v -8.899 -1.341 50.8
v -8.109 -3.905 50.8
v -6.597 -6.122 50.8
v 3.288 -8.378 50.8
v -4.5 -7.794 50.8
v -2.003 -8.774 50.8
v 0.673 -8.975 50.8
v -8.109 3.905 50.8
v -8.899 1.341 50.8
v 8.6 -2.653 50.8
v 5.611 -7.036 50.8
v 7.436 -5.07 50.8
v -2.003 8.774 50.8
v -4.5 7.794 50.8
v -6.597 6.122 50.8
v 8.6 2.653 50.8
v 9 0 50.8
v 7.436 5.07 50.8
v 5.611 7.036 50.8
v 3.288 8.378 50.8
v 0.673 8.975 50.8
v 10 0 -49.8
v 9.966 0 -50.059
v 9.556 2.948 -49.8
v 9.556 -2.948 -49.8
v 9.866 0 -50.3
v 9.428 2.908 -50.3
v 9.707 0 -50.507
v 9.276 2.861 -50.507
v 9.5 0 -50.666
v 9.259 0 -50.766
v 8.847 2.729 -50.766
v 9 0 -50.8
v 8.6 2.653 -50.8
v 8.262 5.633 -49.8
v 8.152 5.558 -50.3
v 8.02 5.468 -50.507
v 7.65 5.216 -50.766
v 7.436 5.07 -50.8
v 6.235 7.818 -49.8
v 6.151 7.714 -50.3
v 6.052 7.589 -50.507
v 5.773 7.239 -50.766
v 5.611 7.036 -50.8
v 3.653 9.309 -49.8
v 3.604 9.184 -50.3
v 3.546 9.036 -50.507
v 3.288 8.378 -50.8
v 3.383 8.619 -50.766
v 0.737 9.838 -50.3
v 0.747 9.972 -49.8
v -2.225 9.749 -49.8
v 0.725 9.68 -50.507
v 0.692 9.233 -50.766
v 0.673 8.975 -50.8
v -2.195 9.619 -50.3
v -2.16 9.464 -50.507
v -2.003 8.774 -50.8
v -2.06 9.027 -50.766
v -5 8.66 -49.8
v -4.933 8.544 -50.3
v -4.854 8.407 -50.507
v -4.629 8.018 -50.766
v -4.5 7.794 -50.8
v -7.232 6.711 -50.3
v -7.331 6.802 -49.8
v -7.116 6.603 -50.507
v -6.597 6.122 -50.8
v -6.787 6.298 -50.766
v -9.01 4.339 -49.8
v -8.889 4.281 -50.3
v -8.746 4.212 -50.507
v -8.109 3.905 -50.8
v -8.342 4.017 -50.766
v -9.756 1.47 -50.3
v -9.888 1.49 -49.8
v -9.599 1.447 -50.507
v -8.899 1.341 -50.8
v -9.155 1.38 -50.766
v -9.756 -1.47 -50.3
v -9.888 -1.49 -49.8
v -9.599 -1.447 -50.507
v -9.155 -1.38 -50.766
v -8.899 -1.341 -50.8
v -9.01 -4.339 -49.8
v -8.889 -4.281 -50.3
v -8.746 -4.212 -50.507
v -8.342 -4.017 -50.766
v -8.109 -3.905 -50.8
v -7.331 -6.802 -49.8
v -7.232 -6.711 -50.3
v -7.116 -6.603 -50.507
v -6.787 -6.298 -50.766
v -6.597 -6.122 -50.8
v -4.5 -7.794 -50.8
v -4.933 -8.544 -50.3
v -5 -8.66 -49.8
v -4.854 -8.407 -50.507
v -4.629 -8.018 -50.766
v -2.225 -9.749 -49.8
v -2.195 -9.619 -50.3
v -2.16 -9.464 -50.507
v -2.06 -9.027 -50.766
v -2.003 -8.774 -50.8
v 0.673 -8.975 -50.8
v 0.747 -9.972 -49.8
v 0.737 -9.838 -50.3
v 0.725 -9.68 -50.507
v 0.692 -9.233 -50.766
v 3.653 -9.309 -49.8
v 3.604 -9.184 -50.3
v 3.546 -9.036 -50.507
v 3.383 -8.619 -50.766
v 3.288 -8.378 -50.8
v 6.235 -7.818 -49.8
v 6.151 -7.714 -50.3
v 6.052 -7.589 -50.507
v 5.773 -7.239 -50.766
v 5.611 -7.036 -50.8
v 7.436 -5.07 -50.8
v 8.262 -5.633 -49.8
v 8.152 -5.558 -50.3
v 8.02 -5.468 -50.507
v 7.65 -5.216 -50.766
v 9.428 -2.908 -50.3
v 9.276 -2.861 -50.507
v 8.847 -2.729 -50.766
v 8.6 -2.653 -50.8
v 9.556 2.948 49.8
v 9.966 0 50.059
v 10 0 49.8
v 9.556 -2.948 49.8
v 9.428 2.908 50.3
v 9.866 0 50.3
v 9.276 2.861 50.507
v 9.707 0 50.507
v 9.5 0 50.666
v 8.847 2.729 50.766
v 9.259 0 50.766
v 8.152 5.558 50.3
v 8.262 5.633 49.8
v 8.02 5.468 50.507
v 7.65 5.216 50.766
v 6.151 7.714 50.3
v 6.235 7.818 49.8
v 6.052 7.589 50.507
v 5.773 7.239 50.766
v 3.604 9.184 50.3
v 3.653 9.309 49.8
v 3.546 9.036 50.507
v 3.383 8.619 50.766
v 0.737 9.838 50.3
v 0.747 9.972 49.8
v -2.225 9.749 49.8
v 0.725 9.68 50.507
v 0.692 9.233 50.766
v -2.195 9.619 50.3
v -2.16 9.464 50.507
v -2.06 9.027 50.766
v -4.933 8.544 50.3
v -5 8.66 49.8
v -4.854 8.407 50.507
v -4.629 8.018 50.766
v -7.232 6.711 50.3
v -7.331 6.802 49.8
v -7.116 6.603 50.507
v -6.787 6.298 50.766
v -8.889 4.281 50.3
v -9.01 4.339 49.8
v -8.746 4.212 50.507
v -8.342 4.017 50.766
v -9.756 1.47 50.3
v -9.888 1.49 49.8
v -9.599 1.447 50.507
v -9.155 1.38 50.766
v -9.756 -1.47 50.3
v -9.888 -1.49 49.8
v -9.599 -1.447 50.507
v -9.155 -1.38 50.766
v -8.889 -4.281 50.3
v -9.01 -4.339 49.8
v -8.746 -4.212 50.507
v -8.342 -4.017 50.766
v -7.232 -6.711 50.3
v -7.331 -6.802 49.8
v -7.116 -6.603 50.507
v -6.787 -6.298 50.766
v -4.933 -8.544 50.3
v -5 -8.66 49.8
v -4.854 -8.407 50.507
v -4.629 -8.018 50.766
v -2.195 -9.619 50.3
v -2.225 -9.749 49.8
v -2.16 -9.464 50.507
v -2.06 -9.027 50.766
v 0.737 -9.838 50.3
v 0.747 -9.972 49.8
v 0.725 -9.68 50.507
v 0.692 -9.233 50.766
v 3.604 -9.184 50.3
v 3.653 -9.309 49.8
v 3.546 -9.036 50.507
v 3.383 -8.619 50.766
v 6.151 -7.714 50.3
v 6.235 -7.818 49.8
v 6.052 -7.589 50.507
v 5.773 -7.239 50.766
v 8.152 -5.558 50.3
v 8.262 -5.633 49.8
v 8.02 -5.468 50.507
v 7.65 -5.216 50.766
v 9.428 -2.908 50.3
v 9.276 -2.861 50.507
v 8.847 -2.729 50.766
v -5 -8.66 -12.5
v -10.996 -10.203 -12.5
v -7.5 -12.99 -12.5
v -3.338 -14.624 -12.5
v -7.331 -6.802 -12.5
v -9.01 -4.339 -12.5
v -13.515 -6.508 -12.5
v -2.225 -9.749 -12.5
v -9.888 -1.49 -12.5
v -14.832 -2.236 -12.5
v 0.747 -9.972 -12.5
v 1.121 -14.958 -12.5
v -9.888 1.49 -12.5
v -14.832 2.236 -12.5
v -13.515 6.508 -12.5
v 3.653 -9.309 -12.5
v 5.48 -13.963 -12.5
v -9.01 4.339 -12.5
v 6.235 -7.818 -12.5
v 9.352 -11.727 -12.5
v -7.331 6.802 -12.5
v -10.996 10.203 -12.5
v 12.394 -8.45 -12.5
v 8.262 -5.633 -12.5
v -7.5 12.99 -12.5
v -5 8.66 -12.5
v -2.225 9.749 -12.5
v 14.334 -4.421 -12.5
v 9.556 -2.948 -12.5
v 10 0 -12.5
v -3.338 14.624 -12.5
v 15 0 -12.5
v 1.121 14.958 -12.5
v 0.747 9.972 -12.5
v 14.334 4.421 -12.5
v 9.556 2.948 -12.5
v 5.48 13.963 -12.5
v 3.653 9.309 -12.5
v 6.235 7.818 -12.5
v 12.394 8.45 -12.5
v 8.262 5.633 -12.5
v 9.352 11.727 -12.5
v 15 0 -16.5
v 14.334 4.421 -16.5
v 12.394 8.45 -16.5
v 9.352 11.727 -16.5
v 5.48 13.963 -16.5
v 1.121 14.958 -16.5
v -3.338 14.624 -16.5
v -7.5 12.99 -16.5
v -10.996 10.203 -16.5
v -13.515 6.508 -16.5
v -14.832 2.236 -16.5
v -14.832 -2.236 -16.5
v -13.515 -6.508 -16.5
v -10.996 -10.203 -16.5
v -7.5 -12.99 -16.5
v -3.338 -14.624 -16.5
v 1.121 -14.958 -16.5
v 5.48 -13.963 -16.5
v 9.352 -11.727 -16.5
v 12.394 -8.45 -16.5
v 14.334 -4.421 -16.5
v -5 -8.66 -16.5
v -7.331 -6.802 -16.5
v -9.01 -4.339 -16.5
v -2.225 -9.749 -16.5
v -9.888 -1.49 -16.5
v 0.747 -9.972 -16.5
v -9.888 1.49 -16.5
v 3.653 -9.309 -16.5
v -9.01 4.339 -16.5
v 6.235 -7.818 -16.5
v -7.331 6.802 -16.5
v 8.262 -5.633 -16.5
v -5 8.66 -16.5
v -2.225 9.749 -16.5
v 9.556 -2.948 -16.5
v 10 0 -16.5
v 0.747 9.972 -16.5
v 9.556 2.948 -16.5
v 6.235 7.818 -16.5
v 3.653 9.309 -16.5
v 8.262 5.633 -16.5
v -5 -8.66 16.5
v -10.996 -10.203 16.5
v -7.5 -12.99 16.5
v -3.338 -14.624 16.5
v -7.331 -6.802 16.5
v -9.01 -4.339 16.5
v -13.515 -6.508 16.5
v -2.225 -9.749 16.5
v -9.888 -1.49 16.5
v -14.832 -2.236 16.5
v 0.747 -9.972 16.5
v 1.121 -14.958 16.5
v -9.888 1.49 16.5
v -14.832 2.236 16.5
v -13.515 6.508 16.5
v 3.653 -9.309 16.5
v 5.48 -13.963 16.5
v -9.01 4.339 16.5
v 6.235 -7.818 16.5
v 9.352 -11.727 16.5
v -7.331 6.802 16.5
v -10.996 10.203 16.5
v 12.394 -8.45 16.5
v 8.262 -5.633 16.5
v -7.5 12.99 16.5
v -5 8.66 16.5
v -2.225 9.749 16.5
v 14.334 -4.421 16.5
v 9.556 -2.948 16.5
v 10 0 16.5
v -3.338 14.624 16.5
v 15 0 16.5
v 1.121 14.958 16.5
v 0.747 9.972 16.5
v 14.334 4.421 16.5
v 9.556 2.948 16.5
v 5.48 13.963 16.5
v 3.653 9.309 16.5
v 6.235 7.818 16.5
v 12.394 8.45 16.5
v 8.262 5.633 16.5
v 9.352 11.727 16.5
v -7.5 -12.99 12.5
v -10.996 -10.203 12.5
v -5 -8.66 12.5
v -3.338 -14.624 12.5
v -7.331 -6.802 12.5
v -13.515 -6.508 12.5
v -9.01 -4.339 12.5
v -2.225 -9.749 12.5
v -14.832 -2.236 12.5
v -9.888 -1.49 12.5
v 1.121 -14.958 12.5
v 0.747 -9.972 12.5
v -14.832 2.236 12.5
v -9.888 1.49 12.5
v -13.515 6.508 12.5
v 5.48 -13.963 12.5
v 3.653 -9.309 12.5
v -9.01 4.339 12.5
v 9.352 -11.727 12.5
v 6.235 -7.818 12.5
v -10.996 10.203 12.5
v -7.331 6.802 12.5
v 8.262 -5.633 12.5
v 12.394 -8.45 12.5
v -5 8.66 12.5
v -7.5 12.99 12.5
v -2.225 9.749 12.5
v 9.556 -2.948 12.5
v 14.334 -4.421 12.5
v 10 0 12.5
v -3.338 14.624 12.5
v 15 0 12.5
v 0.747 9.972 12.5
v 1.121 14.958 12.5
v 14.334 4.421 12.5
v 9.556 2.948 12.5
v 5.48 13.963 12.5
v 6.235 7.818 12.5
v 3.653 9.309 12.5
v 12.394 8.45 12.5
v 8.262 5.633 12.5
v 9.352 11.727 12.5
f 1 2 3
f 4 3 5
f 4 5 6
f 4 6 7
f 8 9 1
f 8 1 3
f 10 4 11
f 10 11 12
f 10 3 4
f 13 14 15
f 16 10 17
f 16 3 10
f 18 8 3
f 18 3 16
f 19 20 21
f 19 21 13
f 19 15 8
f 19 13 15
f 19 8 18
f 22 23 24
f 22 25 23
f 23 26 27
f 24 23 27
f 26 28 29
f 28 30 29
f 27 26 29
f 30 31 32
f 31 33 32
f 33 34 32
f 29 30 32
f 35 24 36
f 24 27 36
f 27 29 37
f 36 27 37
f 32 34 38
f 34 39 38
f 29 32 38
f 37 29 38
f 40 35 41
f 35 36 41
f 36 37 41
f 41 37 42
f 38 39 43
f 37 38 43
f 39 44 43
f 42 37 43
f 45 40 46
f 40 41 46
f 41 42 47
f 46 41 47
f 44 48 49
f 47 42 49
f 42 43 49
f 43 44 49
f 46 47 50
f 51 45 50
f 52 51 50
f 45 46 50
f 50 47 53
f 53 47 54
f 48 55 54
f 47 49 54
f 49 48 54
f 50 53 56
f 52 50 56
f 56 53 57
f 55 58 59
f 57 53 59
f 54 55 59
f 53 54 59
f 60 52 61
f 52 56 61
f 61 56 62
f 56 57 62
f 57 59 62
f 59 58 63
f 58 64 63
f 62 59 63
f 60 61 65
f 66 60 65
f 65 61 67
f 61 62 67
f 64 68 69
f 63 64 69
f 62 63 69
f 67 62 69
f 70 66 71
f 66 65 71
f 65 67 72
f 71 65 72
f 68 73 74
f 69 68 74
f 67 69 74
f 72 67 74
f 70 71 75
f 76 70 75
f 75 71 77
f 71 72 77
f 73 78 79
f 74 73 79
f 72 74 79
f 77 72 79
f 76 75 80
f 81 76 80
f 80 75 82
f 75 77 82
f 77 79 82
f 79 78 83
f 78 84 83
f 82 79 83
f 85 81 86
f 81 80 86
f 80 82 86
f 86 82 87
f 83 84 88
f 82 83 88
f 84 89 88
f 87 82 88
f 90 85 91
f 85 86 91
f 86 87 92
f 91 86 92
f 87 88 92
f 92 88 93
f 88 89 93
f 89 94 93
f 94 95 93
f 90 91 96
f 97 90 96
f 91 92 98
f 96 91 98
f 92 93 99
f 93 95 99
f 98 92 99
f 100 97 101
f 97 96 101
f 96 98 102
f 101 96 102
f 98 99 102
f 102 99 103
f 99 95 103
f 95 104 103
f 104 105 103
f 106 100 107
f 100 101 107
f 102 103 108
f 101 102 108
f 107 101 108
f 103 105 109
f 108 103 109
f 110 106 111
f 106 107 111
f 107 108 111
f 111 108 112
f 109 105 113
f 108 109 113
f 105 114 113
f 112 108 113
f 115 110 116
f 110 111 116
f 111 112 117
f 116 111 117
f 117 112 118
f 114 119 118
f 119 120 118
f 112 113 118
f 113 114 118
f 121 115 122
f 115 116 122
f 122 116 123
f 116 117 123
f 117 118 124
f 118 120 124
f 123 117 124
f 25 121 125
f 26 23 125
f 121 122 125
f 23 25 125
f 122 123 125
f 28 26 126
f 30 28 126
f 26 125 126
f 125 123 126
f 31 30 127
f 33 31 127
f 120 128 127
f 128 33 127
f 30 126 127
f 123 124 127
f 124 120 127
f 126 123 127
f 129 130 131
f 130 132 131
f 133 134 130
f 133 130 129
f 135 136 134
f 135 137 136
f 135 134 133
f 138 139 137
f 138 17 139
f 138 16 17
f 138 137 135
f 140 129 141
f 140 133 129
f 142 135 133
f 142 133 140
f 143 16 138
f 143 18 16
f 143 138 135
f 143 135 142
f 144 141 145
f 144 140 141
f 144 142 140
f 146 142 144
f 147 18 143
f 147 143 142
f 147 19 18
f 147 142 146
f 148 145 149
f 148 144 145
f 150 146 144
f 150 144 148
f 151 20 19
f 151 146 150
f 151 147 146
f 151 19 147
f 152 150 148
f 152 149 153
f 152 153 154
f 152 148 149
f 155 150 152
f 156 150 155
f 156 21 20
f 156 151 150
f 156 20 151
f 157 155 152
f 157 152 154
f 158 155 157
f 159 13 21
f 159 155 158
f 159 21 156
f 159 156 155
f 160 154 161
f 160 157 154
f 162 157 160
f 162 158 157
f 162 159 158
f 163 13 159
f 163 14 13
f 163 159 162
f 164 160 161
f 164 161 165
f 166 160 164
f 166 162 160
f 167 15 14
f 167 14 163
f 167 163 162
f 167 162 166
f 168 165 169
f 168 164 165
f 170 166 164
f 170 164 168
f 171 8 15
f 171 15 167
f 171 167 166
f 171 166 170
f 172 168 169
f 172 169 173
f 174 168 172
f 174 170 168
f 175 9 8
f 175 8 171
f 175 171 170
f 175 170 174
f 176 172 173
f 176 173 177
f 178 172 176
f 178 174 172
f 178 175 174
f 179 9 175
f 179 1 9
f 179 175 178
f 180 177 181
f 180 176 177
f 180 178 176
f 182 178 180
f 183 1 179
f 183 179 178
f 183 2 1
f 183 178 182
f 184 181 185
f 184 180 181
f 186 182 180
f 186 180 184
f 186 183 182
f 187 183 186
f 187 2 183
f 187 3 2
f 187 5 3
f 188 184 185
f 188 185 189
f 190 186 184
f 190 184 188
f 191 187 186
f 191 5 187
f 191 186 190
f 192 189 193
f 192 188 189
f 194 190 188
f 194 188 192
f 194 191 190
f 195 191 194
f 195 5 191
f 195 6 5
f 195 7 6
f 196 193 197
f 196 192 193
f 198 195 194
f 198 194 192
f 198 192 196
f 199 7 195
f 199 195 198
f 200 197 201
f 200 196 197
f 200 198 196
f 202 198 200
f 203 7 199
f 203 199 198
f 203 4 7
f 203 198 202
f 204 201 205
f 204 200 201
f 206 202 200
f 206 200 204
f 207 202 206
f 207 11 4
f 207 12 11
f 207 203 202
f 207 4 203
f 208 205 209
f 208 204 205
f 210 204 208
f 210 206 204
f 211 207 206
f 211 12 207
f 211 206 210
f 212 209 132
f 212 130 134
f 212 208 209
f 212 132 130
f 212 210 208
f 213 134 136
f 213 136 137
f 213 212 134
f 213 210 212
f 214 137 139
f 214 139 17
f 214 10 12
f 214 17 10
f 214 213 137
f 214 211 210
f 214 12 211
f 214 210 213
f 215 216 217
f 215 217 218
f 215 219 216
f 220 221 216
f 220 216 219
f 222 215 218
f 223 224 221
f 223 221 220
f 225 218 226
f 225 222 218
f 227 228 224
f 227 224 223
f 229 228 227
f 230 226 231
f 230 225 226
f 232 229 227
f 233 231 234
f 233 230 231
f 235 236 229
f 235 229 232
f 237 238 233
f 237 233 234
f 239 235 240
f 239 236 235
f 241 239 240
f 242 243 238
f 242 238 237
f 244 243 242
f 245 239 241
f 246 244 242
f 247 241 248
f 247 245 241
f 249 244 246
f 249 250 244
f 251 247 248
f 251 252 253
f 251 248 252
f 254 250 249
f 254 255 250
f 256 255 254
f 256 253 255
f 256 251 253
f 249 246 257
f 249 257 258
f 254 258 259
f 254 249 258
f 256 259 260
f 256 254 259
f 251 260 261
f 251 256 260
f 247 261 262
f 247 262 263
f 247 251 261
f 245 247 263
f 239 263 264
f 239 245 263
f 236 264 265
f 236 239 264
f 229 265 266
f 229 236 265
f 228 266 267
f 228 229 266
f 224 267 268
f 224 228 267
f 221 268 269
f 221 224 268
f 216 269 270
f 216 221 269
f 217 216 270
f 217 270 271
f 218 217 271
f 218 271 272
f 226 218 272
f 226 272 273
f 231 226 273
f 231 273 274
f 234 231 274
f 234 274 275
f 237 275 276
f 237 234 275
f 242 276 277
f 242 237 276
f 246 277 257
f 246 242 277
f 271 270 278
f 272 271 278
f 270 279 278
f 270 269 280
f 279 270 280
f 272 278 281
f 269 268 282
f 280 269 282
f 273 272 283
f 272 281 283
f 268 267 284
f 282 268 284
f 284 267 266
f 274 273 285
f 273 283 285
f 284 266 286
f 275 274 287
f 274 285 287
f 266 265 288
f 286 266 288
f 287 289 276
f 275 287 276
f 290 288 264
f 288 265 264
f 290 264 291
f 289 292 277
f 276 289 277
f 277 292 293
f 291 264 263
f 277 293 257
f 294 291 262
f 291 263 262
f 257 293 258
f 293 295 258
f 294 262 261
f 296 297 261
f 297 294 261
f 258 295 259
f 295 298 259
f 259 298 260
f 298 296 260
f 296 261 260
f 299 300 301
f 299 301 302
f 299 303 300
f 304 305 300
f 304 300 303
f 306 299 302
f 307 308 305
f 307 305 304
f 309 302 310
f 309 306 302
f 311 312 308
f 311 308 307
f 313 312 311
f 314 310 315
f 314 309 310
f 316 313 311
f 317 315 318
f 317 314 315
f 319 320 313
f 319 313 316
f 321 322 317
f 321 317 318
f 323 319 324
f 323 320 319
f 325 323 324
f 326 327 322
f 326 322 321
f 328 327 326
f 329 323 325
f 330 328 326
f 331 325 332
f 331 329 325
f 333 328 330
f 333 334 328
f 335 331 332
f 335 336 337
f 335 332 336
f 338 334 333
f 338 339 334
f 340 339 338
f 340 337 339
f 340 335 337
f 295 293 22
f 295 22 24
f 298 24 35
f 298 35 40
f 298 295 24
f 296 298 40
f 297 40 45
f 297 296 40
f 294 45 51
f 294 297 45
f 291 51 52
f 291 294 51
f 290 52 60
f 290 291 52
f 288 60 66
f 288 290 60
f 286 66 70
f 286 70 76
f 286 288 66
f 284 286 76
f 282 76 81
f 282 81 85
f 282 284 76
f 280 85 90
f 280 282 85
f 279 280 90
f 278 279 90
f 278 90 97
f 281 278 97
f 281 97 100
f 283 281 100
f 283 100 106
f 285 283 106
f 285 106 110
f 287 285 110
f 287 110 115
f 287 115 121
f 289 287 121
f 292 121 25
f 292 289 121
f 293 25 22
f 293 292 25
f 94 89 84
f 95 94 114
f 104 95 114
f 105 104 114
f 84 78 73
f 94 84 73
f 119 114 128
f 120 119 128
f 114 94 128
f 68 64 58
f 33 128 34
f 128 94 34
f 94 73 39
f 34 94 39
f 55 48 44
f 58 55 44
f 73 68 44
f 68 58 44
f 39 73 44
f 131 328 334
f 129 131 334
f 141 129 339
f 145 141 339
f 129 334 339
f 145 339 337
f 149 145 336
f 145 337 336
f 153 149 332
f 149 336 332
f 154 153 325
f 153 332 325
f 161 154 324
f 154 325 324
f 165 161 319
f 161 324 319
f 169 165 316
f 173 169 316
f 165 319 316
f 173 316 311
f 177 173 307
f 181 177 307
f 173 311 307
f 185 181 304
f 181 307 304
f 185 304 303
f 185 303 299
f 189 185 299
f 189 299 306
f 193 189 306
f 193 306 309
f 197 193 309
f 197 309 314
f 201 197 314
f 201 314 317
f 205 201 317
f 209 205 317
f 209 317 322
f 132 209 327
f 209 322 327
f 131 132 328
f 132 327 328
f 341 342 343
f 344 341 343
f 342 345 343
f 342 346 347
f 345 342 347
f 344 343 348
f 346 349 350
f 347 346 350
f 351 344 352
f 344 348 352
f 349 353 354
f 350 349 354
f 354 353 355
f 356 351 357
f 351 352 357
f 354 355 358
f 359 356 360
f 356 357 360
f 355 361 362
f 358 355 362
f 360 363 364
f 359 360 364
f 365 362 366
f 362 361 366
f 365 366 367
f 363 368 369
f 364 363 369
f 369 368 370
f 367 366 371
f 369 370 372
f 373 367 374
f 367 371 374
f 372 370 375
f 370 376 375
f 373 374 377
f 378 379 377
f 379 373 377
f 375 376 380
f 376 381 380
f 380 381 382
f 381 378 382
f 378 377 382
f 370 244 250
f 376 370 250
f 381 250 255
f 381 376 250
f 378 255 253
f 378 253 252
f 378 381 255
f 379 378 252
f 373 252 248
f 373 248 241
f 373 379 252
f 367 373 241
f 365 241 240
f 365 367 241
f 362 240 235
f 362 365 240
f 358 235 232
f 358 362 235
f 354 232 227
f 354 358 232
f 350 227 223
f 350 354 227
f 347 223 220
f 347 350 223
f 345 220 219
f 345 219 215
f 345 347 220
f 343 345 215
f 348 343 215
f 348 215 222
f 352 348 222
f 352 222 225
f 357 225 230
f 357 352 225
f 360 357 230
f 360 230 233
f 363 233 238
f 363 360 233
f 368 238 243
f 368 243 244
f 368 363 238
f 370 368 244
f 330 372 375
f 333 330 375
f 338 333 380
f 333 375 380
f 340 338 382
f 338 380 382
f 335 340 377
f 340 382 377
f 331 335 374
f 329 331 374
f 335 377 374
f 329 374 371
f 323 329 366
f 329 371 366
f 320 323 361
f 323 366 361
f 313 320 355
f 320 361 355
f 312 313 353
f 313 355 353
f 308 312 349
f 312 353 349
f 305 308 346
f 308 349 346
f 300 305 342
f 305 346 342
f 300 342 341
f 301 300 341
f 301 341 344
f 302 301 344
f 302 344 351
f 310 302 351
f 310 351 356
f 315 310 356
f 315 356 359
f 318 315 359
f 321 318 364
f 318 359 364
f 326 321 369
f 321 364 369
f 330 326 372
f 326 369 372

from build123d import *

# Parameters (mm, degrees)
SKETCH2_R           = 10
BOSS_EXTRUDE1_DEPTH = 12.5
SKETCH3_R           = 15
BOSS_EXTRUDE2_DEPTH = 4
SKETCH4_R           = 10
BOSS_EXTRUDE3_DEPTH = 34.3
FILLET1_R           = 1


with BuildPart() as part:
    # Sketch2 → Boss-Extrude1 (new body)
    with BuildSketch(Plane.XY):
        Circle(SKETCH2_R)
    boss_extrude1 = extrude(amount=BOSS_EXTRUDE1_DEPTH)

    # Sketch3 → Boss-Extrude2 (add)
    with BuildSketch(Plane.XY.offset(12.5)):
        Circle(SKETCH3_R)
    boss_extrude2 = extrude(amount=BOSS_EXTRUDE2_DEPTH)

    # Sketch4 → Boss-Extrude3 (add)
    with BuildSketch(Plane.XY.offset(16.5)):
        Circle(SKETCH4_R)
    boss_extrude3 = extrude(amount=BOSS_EXTRUDE3_DEPTH)

    # Mirror1: Boss-Extrude1, Boss-Extrude2, Boss-Extrude3 across plane
    add(boss_extrude1.mirror(Plane.XY))
    add(boss_extrude2.mirror(Plane.XY))
    add(boss_extrude3.mirror(Plane.XY))

    # Fillet1
    fillet1_edges = [part.edges().sort_by_distance(p)[0] for p in [
        (-10, 0, 50.8),
        (-10, 0, -50.8),
    ]]
    fillet(fillet1_edges, radius=FILLET1_R)


solid = part.part
